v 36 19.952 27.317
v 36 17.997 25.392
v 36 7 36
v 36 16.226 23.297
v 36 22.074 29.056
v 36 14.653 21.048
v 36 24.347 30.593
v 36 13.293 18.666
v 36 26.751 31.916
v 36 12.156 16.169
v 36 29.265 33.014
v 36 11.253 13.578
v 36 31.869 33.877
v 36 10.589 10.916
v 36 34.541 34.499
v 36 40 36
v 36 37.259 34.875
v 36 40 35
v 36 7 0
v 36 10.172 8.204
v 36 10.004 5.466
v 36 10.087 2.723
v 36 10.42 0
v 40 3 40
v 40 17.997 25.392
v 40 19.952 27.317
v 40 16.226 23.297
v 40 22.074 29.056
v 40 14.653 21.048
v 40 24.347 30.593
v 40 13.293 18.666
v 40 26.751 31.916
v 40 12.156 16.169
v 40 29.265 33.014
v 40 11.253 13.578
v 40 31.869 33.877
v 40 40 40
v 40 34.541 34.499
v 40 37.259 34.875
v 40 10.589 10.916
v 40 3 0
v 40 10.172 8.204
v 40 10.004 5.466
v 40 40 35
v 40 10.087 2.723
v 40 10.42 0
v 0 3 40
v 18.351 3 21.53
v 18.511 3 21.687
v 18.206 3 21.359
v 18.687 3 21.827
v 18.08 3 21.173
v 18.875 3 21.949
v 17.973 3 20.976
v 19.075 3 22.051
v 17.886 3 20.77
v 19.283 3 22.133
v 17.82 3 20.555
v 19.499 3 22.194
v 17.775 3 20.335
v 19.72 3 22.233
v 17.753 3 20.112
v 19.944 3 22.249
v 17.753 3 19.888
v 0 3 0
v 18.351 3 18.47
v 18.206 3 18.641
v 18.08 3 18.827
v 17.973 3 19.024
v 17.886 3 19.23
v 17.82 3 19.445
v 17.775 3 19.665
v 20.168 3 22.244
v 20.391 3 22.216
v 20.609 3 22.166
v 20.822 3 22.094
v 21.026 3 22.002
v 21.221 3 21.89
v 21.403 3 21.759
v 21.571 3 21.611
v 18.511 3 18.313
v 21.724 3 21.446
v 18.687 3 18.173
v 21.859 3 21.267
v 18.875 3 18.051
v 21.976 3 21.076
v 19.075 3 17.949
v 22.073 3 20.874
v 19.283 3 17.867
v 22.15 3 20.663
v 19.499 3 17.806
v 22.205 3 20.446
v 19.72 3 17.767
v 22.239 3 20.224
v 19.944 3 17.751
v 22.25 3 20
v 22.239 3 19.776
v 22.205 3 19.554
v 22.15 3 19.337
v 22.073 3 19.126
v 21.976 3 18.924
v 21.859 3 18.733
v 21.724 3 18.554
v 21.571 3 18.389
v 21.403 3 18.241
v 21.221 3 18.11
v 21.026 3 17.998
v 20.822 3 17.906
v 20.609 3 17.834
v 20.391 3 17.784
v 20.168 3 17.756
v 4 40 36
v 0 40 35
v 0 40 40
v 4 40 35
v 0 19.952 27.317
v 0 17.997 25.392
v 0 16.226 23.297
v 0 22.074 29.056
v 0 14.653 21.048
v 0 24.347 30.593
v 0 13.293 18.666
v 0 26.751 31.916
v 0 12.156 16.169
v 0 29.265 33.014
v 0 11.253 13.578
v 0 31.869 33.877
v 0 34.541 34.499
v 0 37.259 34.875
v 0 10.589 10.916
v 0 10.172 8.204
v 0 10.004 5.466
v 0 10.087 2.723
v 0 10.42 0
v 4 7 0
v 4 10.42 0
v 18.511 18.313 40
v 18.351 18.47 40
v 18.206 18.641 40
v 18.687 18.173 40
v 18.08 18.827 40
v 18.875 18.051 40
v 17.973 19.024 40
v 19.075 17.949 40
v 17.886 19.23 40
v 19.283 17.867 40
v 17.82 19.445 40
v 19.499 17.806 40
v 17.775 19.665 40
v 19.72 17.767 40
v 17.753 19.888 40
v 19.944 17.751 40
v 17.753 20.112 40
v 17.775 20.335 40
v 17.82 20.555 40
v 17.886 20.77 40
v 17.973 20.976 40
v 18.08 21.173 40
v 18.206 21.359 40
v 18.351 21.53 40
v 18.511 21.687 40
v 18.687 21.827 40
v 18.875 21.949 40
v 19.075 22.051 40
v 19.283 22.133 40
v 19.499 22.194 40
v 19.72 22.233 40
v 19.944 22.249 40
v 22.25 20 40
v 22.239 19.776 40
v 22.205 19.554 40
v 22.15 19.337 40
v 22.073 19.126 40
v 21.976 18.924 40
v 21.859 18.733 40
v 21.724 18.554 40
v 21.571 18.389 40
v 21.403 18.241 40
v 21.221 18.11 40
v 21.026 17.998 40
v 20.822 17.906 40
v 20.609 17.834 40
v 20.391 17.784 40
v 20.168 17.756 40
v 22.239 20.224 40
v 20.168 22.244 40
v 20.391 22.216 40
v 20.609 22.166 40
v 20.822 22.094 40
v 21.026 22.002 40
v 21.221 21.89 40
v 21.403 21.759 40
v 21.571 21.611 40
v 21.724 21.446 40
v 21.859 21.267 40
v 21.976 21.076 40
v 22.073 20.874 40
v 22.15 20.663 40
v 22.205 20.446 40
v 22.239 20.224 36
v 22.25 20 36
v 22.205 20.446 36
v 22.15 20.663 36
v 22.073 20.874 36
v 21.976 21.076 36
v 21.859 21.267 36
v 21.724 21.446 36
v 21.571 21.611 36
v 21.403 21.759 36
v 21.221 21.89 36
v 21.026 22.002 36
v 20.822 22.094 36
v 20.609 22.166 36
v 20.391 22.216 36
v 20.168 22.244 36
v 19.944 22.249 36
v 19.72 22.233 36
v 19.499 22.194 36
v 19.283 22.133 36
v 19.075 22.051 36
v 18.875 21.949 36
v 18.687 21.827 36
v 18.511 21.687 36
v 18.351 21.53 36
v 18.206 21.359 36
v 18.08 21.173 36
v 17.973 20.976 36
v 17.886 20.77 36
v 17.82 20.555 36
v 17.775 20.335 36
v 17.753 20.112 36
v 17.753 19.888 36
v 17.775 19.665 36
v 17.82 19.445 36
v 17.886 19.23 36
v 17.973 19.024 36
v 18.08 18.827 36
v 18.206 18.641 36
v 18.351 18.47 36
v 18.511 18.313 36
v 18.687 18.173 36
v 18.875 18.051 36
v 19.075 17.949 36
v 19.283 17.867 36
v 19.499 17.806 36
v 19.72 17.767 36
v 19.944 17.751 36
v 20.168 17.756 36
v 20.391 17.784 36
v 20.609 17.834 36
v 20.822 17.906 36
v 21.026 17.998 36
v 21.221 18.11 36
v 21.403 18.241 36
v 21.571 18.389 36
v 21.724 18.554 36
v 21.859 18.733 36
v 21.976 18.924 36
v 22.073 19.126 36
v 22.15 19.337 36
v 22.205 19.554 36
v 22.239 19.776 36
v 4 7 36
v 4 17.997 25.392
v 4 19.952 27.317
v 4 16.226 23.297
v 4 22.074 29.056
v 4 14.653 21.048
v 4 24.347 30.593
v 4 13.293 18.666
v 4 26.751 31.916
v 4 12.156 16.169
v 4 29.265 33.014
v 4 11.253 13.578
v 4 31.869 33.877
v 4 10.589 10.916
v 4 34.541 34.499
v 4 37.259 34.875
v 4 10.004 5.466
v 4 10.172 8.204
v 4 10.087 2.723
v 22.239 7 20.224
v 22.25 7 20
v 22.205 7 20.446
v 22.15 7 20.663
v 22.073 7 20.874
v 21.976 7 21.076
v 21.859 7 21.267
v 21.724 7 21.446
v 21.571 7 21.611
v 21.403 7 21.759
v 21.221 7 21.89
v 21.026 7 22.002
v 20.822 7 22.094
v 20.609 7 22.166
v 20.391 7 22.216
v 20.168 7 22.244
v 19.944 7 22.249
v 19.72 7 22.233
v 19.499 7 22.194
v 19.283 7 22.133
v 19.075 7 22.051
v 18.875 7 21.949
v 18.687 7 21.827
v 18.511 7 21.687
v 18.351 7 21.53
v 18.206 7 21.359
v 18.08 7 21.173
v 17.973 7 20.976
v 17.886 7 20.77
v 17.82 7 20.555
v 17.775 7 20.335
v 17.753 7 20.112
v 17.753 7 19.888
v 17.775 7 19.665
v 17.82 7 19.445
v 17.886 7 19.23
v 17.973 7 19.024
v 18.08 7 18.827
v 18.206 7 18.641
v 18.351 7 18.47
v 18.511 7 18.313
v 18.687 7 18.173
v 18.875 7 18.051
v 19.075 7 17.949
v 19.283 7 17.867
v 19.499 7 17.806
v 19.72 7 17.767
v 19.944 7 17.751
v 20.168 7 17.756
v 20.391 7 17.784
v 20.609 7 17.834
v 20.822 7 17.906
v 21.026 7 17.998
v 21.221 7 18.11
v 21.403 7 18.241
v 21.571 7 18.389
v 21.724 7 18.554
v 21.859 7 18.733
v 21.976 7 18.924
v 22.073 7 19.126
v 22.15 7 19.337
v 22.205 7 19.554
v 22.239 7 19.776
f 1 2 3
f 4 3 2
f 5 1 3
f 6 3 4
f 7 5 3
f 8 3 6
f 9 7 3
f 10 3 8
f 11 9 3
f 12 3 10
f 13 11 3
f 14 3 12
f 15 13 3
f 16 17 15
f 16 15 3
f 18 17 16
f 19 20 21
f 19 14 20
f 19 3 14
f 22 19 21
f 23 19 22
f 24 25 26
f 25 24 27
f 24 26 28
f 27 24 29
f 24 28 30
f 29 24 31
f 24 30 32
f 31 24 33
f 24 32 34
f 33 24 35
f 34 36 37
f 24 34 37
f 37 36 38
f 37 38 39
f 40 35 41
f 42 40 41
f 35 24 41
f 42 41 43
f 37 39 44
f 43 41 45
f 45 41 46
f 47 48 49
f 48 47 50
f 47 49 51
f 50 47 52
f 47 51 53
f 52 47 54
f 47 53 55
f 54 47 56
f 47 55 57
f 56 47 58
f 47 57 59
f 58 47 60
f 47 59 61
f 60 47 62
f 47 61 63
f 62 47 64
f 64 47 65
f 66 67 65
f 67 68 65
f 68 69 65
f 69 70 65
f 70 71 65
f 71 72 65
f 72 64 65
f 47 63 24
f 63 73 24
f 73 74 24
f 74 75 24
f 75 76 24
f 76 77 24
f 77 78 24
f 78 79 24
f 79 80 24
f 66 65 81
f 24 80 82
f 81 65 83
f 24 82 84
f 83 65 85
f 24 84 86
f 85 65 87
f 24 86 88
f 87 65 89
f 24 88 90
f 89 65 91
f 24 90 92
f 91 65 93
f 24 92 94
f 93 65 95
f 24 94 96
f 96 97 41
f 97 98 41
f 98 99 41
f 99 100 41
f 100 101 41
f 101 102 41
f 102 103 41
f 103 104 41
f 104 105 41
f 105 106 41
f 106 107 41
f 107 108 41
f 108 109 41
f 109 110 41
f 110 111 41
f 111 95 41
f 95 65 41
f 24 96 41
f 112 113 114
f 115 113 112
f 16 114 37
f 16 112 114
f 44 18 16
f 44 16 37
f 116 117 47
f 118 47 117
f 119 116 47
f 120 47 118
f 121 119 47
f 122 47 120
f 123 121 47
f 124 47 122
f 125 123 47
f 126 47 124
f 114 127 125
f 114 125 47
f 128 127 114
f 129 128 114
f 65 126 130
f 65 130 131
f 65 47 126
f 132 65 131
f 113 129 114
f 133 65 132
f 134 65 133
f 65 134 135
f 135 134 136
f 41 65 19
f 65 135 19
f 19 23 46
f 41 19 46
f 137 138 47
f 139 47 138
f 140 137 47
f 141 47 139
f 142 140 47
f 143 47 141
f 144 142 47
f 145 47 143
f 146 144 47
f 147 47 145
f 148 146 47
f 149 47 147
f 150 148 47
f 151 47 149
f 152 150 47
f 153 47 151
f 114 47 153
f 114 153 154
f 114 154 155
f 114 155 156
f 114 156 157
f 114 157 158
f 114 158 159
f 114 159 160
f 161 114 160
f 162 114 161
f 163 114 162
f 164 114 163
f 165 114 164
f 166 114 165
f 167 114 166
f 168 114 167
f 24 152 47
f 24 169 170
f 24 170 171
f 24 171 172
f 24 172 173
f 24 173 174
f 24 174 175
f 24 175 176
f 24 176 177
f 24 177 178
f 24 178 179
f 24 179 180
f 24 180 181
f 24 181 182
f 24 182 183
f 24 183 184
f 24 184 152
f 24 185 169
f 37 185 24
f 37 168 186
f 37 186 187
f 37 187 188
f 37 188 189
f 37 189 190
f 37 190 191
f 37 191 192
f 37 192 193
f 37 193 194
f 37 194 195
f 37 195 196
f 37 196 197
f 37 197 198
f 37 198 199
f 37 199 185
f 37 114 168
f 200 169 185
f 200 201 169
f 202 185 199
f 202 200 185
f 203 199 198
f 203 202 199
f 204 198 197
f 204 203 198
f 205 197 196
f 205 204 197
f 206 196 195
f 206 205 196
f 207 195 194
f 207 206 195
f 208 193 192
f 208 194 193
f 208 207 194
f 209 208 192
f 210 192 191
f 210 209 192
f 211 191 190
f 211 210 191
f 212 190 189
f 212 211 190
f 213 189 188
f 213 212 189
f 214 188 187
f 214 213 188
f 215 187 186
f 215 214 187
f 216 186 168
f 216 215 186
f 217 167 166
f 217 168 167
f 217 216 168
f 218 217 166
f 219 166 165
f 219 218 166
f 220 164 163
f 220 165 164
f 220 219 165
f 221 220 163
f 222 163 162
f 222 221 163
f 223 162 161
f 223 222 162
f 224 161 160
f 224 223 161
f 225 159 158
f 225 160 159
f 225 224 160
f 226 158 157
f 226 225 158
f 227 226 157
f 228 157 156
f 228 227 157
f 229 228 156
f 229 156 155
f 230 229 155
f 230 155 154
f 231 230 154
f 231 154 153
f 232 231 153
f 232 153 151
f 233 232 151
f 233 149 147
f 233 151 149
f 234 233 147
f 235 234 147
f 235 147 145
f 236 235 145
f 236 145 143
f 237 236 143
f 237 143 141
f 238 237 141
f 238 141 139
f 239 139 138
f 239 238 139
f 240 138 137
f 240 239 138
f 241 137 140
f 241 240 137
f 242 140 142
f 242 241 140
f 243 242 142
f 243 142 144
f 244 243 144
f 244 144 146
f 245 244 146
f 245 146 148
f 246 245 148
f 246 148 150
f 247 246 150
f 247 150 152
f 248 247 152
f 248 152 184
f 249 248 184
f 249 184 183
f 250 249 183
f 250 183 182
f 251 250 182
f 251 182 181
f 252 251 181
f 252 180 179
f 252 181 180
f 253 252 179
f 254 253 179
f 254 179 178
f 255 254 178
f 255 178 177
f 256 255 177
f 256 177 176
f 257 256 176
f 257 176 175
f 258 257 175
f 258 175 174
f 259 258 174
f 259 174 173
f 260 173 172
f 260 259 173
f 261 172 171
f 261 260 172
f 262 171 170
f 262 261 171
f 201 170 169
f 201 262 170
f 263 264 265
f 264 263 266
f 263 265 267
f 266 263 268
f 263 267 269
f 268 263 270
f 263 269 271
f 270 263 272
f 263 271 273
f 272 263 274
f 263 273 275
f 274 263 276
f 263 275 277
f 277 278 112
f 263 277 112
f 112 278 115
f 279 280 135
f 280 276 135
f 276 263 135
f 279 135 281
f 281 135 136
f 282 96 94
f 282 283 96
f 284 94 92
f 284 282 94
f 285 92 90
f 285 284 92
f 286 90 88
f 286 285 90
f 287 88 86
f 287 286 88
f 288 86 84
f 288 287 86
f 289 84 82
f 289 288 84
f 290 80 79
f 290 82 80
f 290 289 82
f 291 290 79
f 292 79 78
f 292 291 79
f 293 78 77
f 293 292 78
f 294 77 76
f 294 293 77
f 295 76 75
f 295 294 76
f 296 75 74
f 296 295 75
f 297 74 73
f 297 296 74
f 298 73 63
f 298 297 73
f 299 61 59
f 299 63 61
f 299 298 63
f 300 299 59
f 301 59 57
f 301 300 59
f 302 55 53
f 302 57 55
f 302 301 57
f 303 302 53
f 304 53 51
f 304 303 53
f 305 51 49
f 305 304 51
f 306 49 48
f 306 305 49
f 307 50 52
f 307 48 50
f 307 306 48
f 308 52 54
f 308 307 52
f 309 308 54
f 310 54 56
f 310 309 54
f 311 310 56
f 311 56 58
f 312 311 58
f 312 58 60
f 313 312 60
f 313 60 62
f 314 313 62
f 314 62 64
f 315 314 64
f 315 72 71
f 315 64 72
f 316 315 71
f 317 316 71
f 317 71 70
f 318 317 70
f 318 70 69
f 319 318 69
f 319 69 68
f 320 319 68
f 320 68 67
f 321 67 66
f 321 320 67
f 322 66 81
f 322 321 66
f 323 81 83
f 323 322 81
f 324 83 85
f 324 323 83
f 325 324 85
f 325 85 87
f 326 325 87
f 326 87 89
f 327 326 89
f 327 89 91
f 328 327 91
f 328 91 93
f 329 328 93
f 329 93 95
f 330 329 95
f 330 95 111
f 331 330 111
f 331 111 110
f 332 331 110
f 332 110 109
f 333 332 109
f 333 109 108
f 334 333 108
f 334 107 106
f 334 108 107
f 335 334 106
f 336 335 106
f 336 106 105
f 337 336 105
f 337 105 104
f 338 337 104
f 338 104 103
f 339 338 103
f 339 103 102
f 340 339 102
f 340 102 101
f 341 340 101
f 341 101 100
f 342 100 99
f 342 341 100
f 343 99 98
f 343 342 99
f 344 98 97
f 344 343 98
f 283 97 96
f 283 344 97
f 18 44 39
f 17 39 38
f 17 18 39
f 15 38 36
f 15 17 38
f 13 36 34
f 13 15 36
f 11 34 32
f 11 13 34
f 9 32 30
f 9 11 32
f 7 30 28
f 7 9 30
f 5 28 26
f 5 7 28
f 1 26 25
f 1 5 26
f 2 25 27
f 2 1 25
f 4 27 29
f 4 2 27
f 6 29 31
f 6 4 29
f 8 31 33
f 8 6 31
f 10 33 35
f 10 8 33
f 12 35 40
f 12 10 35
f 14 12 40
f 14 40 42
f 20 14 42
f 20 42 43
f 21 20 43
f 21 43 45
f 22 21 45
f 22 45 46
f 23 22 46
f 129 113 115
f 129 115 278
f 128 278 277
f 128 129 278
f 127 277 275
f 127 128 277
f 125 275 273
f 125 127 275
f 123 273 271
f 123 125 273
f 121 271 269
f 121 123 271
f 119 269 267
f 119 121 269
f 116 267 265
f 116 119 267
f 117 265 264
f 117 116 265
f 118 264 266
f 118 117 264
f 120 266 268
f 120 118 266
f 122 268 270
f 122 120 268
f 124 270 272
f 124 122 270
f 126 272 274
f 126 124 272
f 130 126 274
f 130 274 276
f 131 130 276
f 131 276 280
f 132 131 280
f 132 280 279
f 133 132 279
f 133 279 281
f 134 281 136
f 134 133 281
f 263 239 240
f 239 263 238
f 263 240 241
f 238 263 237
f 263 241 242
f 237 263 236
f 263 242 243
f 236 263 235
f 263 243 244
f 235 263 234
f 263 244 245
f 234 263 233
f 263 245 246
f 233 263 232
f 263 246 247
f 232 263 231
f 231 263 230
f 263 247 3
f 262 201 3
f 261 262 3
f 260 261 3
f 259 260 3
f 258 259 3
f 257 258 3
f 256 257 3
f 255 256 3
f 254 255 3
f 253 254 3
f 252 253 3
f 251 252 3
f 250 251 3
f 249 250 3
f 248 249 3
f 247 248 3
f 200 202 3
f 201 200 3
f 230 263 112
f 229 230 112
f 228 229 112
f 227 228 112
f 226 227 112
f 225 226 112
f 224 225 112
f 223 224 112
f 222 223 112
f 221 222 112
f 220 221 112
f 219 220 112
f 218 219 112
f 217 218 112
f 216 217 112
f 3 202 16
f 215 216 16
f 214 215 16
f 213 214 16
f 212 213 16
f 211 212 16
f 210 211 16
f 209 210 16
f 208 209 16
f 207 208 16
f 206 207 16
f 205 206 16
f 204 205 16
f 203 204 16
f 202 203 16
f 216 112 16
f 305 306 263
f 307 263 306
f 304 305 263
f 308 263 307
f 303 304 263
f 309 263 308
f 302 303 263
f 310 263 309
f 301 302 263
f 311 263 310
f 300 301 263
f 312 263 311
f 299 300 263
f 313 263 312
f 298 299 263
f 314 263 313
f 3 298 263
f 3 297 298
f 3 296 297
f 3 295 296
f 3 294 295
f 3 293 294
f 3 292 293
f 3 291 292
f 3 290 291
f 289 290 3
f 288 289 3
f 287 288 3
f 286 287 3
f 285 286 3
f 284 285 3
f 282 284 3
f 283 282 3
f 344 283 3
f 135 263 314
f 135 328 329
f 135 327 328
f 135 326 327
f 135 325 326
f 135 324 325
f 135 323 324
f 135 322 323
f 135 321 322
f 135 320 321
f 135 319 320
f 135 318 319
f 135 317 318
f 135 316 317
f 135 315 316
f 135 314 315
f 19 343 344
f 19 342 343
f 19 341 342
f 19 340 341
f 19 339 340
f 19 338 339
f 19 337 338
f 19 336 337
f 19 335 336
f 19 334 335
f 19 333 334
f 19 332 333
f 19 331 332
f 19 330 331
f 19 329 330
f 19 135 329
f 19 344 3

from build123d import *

# Parameters (mm, degrees)
CYLINDER004_R     = 30
CYLINDER004_DEPTH = 40
CYLINDER005_R     = 2.25
CYLINDER005_DEPTH = 20
CYLINDER006_R     = 2.25
CYLINDER006_DEPTH = 20
BOX004_W          = 32
BOX004_H          = 40
BOX004_DEPTH      = 40
BOX003_W          = 40
BOX003_H          = 37
BOX003_DEPTH      = 40


with BuildPart() as cylinder004:
    # Cylinder004 → Cylinder004 (new body)
    with BuildSketch(Plane(origin=(0, 37, 5), x_dir=(0, 0, -1), z_dir=(1, 0, 0))):
        Circle(CYLINDER004_R)
    extrude(amount=CYLINDER004_DEPTH)


with BuildPart() as cylinder005:
    # Cylinder005 → Cylinder005 (new body)
    with BuildSketch(Plane(origin=(20, 10, 20), x_dir=(1, 0, 0), z_dir=(0, -1, 0))):
        Circle(CYLINDER005_R)
    extrude(amount=CYLINDER005_DEPTH)


with BuildPart() as cylinder006:
    # Cylinder006 → Cylinder006 (new body)
    with BuildSketch(Plane(origin=(20, 17, 30), x_dir=(1, 0, 0), z_dir=(0, 0, 1))):
        Circle(CYLINDER006_R)
    extrude(amount=CYLINDER006_DEPTH)


with BuildPart() as fusion002:
    # Box004 → Box004 (new body)
    with BuildSketch(Plane(origin=(4, 4, -4), x_dir=(1, 0, 0), z_dir=(0, 0, 1))):
        with Locations((16, 20)):
            Rectangle(BOX004_W, BOX004_H)
    extrude(amount=BOX004_DEPTH)

    # Fusion002: union Cylinder004, Cylinder005, Cylinder006
    add(cylinder004.part)
    add(cylinder005.part)
    add(cylinder006.part)


with BuildPart() as cut002:
    # Box003 → Box003 (new body)
    with BuildSketch(Plane.XY):
        with Locations((20, 18.5)):
            Rectangle(BOX003_W, BOX003_H)
    extrude(amount=BOX003_DEPTH)

    # Cut002: cut Fusion002
    add(fusion002.part, mode=Mode.SUBTRACT)


with BuildPart() as cut002_1:
    # Cut002 placement: moved
    add(cut002.part.moved(Location((0, 3, 0))))


solid = cut002_1.part
